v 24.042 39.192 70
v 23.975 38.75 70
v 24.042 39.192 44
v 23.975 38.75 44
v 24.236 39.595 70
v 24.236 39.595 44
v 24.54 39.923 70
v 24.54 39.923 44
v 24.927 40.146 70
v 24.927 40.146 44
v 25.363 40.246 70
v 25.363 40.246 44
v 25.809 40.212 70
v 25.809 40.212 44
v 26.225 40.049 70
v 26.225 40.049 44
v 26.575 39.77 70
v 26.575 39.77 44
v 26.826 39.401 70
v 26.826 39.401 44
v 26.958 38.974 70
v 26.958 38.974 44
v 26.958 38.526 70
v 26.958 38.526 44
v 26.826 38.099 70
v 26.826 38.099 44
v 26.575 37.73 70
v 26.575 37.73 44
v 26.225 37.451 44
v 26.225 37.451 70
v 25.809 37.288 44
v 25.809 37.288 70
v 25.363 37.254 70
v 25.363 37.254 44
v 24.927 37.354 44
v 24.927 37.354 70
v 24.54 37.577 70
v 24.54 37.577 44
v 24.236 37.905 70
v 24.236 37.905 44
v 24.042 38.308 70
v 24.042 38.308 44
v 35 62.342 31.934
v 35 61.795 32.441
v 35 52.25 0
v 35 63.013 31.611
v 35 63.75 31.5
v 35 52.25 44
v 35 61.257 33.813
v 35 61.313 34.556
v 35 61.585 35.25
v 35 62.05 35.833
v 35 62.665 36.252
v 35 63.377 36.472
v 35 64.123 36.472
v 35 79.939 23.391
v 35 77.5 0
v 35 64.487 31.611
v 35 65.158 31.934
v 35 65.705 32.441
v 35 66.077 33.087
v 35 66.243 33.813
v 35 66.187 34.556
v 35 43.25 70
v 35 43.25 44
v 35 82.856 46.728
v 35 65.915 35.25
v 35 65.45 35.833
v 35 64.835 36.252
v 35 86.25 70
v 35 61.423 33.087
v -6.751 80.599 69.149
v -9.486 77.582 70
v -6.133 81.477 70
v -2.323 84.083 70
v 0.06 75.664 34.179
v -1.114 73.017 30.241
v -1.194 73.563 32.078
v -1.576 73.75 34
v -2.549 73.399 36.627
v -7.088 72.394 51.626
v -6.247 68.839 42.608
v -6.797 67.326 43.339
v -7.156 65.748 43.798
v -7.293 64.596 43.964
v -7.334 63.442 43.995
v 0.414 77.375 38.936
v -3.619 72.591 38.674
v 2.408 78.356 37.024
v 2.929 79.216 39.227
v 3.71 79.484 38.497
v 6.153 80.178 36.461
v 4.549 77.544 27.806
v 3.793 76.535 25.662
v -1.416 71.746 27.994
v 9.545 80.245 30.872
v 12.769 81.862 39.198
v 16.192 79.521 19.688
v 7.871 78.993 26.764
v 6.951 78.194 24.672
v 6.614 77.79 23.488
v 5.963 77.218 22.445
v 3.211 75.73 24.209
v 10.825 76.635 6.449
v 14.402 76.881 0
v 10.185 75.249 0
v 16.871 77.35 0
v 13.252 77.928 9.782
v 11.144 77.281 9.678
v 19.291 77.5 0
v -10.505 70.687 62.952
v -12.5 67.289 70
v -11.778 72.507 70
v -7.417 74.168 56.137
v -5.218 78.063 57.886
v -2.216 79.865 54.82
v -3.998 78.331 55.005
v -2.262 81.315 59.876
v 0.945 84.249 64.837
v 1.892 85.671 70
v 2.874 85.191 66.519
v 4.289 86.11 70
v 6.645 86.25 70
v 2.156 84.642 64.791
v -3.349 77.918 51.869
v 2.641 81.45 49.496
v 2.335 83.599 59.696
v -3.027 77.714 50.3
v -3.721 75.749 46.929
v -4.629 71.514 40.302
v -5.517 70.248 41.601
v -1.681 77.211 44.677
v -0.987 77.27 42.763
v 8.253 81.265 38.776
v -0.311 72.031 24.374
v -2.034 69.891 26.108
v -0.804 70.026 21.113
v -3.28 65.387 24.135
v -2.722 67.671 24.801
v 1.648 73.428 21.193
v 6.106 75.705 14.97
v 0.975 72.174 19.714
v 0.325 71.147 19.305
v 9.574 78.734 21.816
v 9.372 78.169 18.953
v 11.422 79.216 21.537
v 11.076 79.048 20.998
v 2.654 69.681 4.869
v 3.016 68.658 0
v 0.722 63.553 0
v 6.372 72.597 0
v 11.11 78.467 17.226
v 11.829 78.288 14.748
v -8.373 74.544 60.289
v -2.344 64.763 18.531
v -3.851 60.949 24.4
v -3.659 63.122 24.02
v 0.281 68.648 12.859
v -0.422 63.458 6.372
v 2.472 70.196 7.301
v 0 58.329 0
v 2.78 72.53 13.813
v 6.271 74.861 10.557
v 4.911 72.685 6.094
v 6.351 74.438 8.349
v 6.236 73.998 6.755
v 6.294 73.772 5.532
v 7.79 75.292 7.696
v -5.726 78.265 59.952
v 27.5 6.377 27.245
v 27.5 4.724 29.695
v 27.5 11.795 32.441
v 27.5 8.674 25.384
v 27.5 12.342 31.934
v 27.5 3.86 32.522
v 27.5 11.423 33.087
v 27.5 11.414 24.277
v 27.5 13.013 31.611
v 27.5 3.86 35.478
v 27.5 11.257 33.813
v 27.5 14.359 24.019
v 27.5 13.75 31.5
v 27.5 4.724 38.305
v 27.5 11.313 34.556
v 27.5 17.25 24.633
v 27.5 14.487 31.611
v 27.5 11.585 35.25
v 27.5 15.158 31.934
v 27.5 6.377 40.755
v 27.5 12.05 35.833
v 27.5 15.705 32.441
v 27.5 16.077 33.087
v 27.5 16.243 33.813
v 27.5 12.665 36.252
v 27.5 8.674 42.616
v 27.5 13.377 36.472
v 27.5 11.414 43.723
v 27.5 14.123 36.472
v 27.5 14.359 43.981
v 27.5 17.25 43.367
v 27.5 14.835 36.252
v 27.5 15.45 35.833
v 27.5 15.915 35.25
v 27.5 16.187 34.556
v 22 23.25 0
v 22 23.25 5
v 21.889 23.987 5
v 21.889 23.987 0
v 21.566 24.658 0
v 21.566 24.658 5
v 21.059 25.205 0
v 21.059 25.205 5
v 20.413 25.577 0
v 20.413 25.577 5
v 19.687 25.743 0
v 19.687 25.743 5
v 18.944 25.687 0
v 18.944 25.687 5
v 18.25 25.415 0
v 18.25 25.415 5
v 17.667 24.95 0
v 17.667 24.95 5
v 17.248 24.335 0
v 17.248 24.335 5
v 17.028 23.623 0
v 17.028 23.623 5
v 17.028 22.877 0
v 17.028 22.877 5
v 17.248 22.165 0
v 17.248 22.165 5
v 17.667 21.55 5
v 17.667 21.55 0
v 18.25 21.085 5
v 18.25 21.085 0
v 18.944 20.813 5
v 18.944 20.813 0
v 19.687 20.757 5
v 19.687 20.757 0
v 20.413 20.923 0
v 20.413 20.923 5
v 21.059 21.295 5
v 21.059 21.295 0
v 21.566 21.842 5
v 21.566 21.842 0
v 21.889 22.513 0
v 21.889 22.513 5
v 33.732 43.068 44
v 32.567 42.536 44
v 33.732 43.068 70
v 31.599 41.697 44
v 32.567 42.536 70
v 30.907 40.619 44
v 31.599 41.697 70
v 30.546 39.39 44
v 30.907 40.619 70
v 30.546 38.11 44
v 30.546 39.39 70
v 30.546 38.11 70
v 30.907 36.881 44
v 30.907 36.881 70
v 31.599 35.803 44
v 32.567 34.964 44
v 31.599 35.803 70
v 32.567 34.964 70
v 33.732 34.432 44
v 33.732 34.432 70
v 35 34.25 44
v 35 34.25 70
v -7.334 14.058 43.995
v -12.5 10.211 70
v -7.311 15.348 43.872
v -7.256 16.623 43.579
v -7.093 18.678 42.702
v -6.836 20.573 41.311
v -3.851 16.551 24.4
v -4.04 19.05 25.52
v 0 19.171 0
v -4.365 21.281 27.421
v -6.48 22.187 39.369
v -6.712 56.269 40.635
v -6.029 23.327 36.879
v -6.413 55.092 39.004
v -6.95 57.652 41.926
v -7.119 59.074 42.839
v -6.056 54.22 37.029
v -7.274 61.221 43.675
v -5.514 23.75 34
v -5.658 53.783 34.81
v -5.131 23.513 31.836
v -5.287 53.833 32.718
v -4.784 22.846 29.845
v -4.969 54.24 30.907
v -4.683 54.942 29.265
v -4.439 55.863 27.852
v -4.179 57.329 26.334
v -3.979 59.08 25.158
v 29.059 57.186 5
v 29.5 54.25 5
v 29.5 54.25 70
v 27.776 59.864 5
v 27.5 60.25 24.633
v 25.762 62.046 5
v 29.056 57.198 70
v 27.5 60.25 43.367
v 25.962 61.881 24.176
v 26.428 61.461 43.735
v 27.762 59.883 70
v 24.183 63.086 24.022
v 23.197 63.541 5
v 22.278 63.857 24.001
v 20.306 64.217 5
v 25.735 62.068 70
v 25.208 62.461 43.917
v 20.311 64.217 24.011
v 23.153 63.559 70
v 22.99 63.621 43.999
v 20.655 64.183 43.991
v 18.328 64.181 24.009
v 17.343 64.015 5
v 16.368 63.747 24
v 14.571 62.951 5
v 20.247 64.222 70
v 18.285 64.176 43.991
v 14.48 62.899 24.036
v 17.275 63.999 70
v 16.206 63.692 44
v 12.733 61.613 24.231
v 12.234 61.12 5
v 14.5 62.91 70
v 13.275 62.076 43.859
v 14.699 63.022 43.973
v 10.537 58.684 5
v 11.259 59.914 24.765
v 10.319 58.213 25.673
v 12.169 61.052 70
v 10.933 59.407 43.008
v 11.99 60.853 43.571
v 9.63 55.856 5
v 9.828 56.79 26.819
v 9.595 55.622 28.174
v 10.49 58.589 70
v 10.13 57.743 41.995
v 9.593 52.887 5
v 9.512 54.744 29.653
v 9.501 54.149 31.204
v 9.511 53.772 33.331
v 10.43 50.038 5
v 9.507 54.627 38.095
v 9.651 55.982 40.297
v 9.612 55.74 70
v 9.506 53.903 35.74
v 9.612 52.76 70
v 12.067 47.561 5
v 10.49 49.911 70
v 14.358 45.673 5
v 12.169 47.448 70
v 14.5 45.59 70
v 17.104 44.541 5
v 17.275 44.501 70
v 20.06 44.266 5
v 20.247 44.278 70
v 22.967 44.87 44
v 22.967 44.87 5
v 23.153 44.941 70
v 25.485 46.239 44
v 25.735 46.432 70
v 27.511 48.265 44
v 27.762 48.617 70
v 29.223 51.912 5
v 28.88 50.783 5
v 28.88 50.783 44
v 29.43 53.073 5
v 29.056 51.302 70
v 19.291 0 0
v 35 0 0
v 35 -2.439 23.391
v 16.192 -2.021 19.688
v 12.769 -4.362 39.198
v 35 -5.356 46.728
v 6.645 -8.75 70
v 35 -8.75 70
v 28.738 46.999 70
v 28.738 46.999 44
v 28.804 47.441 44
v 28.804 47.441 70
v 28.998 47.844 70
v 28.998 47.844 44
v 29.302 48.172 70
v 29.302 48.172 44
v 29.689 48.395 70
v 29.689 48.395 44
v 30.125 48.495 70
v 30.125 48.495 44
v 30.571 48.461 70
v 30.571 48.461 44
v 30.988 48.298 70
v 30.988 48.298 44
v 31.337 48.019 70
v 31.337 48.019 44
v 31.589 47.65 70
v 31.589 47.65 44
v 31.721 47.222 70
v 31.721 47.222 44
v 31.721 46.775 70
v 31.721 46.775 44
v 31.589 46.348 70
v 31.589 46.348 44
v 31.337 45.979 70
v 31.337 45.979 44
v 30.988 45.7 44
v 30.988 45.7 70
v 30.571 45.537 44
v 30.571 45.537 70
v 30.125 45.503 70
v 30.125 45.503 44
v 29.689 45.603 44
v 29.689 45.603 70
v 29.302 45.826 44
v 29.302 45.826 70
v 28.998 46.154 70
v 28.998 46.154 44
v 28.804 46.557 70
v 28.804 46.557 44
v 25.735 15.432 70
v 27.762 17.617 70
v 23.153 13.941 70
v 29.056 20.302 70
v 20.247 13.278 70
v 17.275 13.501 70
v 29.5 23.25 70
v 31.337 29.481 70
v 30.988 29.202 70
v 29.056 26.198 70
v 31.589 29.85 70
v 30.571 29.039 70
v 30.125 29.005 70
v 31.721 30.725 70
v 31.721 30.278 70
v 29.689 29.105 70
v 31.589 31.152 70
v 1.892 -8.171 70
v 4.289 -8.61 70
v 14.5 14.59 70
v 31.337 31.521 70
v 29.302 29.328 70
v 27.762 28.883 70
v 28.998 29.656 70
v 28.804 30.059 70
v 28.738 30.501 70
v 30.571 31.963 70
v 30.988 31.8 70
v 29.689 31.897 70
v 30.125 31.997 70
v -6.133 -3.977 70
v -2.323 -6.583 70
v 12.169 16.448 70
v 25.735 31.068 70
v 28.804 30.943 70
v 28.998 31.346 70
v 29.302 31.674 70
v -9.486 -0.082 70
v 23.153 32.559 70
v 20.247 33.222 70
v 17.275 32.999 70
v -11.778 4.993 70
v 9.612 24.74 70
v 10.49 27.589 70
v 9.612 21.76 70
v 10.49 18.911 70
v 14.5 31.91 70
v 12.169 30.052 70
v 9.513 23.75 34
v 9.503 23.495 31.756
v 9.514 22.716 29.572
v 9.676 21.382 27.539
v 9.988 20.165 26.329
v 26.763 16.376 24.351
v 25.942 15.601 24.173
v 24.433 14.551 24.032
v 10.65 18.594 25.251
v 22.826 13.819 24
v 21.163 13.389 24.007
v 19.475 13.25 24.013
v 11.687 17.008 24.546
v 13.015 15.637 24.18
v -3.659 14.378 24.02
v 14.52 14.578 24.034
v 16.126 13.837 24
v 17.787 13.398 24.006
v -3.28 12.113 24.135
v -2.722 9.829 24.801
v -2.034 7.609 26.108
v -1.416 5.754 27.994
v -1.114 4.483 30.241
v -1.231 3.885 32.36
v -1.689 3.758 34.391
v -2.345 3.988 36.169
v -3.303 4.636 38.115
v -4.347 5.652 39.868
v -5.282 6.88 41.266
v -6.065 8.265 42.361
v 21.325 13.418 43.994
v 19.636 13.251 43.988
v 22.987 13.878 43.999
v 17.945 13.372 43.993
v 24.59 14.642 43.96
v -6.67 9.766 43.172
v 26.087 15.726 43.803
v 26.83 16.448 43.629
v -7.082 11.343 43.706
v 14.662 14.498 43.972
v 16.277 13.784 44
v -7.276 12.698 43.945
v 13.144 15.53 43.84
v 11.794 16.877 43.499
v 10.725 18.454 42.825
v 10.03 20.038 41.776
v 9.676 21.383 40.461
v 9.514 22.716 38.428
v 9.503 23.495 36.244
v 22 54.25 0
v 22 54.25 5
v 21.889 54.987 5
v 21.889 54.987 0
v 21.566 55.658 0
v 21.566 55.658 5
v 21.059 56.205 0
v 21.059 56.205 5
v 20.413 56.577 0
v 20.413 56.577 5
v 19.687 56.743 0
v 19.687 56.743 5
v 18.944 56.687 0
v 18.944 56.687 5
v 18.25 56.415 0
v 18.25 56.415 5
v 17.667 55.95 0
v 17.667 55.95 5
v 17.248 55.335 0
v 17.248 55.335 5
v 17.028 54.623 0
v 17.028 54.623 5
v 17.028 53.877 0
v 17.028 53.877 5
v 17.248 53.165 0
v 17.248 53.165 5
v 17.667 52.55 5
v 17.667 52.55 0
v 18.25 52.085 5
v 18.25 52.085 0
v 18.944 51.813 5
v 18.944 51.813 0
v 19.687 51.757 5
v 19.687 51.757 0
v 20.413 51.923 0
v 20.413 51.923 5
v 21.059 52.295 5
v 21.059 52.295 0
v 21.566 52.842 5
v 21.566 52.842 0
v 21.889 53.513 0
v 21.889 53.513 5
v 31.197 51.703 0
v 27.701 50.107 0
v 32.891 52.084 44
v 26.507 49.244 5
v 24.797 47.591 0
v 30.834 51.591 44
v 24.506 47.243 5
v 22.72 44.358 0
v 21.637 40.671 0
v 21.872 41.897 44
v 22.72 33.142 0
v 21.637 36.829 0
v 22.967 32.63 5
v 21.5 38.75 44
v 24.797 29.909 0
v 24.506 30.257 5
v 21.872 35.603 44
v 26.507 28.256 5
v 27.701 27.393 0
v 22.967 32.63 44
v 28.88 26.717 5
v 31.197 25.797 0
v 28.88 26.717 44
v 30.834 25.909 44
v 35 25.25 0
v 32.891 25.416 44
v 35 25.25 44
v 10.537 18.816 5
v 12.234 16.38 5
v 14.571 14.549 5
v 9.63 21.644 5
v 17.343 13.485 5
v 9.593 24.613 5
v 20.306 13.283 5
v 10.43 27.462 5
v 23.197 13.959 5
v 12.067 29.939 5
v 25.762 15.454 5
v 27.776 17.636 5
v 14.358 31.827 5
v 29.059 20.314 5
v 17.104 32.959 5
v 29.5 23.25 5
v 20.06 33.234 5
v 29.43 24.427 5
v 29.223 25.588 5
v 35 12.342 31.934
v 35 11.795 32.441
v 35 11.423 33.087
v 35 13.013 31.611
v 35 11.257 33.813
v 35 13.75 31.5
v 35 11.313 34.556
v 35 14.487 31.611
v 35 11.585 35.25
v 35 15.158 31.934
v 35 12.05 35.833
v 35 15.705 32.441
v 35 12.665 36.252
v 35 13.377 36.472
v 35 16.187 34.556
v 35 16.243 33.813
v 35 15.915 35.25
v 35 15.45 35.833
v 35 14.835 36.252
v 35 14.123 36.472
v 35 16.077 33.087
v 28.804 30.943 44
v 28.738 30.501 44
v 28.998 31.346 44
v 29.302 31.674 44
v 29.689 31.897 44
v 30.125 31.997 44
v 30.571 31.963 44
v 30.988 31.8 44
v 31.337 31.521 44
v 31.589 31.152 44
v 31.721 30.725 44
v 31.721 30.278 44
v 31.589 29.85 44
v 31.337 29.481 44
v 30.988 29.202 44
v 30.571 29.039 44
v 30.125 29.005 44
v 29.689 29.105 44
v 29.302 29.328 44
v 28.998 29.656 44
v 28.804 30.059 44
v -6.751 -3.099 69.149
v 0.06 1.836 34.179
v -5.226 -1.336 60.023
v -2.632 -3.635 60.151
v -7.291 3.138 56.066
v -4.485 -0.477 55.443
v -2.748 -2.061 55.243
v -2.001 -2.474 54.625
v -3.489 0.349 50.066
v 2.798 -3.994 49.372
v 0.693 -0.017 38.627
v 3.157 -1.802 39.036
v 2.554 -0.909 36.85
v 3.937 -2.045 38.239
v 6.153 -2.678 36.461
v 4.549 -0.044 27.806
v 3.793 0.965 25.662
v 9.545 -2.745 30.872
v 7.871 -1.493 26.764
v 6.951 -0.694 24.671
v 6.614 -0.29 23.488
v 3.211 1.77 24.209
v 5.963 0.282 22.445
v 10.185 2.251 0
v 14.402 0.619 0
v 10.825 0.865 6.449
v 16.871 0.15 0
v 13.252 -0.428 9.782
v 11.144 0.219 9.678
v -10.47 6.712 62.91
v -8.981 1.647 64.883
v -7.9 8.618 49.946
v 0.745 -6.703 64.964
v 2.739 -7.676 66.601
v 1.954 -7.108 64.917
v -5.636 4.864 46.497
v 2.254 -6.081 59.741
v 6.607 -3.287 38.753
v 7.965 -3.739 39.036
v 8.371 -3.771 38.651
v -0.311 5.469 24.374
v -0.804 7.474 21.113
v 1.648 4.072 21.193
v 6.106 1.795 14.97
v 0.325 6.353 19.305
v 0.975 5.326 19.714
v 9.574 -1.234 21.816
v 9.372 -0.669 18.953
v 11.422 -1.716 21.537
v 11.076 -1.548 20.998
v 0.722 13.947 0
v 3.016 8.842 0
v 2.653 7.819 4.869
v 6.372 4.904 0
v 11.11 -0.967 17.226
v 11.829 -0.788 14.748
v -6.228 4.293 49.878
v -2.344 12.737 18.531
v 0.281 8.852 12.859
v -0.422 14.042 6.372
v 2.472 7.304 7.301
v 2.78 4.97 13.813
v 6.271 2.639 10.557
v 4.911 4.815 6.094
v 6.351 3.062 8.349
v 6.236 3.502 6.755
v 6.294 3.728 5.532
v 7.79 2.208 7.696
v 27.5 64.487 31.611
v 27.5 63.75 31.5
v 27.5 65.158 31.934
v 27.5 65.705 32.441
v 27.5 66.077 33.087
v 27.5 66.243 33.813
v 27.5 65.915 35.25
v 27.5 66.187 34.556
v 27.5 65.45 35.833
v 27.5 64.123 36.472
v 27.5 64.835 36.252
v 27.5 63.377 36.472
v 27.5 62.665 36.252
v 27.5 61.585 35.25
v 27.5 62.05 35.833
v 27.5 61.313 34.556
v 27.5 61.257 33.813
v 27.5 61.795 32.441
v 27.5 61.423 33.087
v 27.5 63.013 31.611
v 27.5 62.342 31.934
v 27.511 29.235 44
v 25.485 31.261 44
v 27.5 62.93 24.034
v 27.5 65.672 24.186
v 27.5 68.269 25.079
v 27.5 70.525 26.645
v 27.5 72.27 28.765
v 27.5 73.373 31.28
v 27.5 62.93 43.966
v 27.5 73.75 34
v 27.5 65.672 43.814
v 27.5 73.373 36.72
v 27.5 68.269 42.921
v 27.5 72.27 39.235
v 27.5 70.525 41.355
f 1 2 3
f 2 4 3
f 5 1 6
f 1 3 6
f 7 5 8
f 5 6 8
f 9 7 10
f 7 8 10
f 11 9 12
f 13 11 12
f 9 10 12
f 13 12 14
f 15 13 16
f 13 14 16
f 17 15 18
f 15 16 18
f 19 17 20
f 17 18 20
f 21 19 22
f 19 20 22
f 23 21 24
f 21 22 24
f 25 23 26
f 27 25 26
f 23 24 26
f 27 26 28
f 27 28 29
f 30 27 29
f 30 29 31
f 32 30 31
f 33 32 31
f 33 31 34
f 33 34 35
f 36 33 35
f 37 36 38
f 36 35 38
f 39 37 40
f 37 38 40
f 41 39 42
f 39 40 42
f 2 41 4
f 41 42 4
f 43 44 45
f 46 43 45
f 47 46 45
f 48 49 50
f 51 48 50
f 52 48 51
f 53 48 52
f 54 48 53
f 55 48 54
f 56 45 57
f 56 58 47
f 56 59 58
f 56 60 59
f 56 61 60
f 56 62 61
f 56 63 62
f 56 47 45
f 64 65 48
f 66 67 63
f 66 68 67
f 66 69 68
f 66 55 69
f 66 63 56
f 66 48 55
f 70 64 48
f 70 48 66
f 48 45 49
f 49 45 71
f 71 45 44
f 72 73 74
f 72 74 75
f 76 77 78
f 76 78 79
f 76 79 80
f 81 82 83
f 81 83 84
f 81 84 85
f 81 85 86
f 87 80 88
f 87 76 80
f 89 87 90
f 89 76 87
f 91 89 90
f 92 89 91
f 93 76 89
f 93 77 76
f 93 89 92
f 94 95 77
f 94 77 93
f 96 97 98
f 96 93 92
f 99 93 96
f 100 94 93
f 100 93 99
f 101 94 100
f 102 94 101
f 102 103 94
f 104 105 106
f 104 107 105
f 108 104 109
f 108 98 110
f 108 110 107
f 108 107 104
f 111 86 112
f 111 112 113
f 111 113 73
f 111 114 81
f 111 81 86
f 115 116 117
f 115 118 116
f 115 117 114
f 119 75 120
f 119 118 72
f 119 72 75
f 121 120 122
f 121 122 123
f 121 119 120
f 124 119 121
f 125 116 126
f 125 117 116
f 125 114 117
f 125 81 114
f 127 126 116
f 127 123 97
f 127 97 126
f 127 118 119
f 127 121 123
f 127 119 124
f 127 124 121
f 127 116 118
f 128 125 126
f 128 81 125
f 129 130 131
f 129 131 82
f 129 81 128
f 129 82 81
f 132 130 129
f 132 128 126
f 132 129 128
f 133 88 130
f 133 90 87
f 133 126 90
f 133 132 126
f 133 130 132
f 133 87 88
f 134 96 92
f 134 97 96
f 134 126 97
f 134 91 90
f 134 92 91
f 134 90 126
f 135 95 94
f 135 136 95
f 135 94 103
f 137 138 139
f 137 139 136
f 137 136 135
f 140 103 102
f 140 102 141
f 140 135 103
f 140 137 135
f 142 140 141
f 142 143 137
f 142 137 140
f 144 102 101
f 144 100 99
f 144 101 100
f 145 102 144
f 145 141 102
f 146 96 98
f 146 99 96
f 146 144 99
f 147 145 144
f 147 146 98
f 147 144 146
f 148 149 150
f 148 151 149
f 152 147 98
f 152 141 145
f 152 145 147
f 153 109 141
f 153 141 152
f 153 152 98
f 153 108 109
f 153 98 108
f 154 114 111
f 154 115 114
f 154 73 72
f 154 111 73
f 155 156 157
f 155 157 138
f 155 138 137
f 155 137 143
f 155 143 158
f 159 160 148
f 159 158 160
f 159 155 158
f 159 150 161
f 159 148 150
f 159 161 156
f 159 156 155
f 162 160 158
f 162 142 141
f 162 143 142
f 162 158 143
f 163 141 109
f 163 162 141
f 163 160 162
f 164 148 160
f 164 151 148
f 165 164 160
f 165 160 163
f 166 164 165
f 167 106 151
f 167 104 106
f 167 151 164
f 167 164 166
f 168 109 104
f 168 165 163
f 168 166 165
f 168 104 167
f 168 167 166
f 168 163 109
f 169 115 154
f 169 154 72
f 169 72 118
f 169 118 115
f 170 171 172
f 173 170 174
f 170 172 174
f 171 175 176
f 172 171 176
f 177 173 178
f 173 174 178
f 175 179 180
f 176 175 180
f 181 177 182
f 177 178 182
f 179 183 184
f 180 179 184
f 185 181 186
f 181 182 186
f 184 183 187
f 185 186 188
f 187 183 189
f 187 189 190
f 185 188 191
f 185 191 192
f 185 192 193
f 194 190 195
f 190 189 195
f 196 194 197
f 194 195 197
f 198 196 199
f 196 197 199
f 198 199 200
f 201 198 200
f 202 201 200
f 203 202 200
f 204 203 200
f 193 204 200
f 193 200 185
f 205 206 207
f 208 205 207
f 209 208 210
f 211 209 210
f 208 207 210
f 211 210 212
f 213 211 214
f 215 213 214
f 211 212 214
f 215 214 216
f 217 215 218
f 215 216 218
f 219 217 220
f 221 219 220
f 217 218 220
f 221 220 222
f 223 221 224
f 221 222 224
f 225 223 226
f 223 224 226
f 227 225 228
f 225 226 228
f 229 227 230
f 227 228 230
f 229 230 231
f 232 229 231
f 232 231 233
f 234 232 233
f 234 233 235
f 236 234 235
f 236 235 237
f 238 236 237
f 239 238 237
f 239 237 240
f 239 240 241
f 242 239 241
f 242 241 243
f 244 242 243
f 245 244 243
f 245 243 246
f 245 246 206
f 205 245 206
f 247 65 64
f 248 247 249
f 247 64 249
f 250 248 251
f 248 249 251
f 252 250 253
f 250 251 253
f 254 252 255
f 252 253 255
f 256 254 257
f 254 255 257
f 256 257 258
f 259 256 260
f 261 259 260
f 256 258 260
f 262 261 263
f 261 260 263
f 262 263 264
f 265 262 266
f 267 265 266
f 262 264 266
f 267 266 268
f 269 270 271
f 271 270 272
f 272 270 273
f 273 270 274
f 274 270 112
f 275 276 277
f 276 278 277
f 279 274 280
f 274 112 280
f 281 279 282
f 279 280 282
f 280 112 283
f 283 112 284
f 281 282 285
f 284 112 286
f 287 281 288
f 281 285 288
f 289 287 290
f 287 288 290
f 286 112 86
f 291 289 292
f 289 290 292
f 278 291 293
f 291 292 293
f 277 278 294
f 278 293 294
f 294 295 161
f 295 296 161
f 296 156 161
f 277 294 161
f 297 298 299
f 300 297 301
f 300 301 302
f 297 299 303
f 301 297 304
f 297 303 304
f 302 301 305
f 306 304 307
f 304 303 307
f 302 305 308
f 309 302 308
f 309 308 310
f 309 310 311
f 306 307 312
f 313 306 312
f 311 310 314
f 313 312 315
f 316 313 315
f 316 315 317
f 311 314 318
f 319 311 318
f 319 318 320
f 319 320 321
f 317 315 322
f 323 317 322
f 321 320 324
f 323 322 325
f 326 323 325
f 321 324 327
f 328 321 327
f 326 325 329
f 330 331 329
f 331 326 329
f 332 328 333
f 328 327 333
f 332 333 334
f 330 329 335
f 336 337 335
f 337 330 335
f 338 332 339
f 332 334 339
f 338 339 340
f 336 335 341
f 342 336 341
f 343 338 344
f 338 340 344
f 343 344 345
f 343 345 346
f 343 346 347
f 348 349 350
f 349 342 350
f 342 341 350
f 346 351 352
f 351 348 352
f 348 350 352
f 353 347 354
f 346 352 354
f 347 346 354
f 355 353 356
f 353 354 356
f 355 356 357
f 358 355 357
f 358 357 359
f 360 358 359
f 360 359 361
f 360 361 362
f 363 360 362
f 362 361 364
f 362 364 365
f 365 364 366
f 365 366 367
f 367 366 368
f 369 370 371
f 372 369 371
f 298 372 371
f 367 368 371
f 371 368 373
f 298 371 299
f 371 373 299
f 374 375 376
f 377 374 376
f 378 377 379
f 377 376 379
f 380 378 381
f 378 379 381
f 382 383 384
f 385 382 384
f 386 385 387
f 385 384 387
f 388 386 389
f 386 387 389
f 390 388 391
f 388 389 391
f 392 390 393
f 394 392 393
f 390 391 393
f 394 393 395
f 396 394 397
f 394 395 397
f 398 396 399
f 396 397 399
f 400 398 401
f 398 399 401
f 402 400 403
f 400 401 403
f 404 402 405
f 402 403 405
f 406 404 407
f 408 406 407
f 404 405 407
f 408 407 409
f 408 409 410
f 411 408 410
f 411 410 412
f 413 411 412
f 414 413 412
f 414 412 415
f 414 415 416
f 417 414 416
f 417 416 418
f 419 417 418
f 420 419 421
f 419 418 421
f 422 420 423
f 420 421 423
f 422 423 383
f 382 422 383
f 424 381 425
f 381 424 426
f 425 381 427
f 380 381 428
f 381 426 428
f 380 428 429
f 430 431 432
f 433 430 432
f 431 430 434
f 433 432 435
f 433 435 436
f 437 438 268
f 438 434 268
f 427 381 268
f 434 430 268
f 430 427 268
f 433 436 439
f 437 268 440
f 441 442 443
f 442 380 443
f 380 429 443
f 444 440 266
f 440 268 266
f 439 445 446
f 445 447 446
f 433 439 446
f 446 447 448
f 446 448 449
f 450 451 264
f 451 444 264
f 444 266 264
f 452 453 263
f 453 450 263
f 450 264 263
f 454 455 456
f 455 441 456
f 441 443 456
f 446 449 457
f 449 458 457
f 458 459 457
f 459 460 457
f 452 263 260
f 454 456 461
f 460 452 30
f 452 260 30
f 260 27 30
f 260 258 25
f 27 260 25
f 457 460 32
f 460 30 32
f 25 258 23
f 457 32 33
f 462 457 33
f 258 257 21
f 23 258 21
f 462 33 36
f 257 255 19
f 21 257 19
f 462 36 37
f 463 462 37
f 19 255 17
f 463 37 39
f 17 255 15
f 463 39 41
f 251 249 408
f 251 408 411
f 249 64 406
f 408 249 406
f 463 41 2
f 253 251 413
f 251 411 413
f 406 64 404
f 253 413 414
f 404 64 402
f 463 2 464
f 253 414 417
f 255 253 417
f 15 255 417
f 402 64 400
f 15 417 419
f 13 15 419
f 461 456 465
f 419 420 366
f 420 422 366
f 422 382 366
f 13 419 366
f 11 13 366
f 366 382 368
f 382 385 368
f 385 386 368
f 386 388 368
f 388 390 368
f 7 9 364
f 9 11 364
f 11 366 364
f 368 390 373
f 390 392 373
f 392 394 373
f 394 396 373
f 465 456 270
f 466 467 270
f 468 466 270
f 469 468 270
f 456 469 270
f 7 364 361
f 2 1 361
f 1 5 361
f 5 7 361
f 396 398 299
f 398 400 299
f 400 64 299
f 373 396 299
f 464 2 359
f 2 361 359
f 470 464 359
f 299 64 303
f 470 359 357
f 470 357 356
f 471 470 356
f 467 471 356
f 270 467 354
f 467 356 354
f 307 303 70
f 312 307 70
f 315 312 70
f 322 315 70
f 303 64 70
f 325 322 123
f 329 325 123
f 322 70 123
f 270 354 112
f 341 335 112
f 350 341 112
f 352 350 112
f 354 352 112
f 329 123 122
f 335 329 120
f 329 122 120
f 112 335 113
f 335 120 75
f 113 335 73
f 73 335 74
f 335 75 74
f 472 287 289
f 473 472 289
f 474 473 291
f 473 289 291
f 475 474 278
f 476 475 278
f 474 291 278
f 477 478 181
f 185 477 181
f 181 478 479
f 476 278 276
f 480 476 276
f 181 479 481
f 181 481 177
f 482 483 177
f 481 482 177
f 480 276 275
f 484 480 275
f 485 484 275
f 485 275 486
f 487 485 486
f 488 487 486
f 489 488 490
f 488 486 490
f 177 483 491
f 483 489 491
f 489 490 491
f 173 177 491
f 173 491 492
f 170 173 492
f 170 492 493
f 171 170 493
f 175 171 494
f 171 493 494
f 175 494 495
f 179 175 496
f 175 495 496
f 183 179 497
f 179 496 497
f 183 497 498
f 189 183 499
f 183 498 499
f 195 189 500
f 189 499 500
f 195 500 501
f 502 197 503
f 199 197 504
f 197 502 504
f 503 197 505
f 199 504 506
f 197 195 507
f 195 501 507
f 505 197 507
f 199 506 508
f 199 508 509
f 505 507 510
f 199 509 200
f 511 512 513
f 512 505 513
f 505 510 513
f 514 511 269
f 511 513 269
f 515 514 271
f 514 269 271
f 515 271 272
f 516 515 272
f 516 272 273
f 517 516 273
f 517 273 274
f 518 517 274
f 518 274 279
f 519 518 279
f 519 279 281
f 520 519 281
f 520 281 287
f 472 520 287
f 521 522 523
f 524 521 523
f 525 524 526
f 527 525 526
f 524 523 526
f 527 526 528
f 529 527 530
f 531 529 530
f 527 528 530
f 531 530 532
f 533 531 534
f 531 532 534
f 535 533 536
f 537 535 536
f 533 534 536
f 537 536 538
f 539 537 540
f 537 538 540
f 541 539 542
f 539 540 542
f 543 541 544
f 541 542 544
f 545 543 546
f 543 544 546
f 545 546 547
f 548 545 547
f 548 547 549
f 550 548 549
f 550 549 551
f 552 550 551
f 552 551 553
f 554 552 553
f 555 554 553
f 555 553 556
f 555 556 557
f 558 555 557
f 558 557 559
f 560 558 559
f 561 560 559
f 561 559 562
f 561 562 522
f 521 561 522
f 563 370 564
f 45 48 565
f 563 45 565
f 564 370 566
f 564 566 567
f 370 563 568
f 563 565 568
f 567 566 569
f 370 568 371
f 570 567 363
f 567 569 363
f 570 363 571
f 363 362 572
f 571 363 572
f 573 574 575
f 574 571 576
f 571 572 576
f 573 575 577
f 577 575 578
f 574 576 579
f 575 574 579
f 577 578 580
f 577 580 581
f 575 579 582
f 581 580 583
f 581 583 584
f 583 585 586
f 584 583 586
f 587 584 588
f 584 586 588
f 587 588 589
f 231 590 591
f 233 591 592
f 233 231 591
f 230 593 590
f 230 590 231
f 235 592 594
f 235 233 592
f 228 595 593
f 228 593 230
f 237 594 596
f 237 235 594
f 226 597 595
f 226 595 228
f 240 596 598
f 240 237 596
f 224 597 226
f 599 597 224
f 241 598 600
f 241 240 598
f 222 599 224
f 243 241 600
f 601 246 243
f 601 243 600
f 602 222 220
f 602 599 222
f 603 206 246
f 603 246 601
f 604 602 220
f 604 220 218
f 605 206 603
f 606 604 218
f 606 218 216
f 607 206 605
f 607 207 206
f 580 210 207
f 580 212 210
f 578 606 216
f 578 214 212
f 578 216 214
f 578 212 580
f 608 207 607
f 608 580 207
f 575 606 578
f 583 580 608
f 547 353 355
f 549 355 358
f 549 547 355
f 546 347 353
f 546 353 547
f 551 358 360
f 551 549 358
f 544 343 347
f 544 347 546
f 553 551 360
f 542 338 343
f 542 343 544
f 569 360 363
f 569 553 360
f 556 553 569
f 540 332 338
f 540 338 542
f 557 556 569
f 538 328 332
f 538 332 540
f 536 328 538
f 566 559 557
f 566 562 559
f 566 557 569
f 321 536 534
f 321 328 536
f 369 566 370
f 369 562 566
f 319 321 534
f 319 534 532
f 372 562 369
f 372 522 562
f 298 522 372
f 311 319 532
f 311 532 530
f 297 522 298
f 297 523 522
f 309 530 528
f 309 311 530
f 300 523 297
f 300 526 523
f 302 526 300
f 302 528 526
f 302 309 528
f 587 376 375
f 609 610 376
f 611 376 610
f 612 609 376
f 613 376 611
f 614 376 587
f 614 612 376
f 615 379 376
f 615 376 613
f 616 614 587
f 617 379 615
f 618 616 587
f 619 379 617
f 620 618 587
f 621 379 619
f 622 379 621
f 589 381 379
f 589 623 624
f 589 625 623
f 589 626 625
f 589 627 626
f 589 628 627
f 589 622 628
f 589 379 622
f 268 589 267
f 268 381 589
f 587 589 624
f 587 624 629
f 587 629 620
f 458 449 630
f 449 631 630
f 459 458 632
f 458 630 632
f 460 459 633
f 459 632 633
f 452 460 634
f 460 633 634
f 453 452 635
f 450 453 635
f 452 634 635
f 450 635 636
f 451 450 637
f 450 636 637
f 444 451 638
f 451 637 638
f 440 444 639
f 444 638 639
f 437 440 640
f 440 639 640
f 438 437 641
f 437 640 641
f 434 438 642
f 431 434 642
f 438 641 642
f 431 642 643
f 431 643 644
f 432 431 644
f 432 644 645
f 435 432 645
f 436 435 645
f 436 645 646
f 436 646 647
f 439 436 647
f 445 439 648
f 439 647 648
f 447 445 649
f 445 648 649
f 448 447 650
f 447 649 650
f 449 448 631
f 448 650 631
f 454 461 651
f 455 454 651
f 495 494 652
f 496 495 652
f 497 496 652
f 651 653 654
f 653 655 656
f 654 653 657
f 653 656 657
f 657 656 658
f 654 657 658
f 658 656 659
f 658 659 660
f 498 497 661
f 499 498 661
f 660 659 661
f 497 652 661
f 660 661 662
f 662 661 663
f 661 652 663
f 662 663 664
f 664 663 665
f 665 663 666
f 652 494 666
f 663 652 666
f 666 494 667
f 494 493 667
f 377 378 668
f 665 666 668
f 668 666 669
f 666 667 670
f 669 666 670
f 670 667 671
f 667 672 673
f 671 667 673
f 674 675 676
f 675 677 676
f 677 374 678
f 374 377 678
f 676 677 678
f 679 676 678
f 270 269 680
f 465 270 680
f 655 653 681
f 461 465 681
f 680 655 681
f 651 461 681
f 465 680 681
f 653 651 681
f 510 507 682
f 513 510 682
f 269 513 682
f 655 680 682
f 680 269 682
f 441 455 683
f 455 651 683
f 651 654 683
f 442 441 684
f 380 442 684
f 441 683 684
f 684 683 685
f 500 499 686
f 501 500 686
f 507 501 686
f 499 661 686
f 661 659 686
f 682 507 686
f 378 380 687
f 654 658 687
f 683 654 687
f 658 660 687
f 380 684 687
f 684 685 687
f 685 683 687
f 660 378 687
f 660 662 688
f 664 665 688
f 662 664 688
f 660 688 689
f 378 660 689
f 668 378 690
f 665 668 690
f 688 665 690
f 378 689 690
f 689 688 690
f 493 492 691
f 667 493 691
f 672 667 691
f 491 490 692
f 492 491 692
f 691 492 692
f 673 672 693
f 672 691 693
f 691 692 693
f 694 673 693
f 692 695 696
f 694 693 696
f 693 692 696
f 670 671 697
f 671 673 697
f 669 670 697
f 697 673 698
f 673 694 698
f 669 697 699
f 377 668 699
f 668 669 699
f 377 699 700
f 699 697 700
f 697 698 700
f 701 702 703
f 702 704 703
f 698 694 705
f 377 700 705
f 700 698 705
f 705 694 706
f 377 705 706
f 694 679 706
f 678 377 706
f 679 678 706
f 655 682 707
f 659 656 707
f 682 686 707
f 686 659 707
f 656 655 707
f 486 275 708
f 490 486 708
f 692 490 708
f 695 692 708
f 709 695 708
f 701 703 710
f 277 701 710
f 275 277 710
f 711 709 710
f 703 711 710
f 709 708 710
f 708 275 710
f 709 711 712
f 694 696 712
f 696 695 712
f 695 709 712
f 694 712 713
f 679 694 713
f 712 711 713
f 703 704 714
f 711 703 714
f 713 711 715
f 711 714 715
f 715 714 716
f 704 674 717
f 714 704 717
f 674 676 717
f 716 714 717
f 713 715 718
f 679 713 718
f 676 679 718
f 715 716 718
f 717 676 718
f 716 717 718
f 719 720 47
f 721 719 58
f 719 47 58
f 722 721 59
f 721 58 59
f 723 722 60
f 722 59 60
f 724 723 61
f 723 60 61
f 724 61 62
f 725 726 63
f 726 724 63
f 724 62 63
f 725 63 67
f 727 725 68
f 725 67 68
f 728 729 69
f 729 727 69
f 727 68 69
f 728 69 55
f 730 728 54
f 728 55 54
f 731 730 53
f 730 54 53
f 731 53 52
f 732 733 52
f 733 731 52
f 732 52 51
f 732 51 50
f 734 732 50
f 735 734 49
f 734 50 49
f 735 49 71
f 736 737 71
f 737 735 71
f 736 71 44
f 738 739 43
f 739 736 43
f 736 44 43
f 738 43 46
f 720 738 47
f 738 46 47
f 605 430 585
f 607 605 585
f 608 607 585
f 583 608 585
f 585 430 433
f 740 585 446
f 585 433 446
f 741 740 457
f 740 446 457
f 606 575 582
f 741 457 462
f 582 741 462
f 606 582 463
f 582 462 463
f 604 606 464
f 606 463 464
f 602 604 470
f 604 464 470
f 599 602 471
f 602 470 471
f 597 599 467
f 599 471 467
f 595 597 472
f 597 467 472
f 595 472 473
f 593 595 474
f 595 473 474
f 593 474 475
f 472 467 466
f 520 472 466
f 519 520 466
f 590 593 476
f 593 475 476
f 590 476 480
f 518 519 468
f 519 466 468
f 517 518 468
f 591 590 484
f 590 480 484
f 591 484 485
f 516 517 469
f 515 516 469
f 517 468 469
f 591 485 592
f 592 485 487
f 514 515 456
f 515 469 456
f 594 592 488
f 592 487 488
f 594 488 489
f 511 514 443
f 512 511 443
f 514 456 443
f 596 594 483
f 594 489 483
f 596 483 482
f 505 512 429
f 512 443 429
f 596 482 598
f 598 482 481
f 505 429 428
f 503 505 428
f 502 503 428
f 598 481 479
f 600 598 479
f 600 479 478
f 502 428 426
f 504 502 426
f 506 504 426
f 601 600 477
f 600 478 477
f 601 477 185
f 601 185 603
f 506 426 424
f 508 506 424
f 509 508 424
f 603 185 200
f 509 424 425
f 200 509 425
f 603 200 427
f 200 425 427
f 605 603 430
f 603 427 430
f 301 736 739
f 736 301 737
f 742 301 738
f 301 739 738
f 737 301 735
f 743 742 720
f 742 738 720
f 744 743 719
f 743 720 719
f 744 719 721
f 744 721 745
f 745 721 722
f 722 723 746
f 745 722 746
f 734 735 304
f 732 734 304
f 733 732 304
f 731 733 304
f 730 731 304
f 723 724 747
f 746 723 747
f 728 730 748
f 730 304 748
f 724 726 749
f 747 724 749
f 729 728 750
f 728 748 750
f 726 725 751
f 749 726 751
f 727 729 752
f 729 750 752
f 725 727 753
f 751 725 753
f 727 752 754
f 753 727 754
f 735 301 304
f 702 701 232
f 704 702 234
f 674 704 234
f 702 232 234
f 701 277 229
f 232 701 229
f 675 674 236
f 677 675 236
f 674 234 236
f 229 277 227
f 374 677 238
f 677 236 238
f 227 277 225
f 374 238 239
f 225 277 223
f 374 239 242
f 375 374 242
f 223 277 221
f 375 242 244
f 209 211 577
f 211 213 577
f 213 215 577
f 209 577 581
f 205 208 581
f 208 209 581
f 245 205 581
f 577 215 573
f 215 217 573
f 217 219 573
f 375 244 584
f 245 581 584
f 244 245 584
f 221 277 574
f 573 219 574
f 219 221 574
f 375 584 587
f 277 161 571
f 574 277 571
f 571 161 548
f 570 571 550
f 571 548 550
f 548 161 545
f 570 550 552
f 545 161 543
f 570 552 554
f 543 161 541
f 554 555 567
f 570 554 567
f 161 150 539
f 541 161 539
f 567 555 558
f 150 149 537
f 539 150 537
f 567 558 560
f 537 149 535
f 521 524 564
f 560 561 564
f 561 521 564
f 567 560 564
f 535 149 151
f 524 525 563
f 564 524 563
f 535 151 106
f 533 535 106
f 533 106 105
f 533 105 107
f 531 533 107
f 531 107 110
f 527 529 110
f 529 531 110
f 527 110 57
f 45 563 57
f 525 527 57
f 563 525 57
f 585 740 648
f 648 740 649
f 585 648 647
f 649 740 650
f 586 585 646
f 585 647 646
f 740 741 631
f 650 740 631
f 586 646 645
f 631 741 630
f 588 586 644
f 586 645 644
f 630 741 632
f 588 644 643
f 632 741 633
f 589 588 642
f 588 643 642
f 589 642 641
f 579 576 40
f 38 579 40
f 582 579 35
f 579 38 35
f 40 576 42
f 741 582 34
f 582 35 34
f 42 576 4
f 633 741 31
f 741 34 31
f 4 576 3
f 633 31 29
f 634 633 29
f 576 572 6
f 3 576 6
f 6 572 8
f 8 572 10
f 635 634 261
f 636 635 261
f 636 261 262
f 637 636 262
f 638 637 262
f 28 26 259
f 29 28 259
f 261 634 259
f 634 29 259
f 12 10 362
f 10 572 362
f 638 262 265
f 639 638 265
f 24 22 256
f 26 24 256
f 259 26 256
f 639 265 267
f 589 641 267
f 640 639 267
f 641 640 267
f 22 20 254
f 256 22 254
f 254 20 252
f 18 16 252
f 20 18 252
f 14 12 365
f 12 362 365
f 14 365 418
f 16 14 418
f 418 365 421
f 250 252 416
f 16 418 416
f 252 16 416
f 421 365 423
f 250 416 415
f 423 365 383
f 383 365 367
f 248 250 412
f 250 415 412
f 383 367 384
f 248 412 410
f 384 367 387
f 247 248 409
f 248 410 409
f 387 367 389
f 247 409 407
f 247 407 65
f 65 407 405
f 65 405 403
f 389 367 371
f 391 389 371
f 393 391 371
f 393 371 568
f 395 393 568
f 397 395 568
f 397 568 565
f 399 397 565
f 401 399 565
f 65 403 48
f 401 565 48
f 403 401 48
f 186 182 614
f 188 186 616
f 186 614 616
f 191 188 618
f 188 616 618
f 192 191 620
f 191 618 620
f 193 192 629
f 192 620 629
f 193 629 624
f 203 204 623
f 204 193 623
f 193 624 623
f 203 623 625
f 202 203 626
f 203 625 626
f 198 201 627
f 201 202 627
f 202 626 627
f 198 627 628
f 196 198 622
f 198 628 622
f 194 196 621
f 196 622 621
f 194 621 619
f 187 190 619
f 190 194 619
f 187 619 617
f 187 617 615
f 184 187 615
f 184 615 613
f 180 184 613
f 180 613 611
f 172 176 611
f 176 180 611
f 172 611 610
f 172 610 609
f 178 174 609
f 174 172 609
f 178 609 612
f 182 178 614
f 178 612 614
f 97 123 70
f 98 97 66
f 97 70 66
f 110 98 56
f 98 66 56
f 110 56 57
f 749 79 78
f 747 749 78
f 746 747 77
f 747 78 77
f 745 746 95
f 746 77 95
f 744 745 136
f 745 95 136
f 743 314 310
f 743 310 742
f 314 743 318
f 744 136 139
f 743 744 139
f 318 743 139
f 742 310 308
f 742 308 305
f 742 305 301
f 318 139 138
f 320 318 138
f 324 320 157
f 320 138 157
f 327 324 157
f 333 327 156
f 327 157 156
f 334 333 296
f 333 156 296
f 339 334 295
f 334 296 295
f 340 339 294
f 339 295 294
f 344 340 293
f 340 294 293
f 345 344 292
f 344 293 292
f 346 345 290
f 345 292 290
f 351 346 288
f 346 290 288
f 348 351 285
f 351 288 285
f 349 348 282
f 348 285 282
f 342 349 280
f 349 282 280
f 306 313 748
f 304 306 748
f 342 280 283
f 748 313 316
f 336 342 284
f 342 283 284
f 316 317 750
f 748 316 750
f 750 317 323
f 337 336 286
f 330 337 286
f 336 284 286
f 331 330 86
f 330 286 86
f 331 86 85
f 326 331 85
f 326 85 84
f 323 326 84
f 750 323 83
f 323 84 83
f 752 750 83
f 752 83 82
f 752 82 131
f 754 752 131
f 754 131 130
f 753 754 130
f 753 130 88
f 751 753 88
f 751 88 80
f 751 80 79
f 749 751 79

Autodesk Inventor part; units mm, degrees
sketch "Sketch1" plane through (0, 0, 0) normal (0, 0, 1) x (1, 0, 0)
  line L0 (0, 0) -> (70, 0)
  line L1 (70, 0) -> (70, 77.5)
  line L2 (70, 77.5) -> (0, 77.5)
  line L3 (0, 77.5) -> (0, 0)
  dimension "d0" = 70
  dimension "d1" = 77.5
extrude "Extrusion1" add sketch "Sketch1" along normal blind 70
sketch "Sketch3" plane through (0, 0, 70) normal (0, 0, 1) x (1, 0, 0)
  line L0 (0, 0) -> (70, 0) projected
  line L1 (70, 77.5) -> (0, 77.5) projected
  line L2 (70, 0) -> (35, 0)
  line L3 (35, 0) -> (35, 77.5)
  line L4 (35, 77.5) -> (70, 77.5)
  line L5 (70, 77.5) -> (70, 0)
extrude "Extrusion3" cut sketch "Sketch3" against normal through all
sketch "Sketch4" plane through (0, 77.5, 70) normal (0, 1, 0) x (1, 0, 0)
  line L0 (0, 70) -> (0, 0) projected
  line L1 (0, 0) -> (-12.5, 0)
  line L2 (35, 70) -> (0, 70) projected
  arc A0 (-12.5, 0) -> (0, 70) centre (-1137.8005, 237.0626) ccw
  line L3 (-12.5, -10) -> (35, -10) construction
  dimension "d9" = 1150
  dimension "d54" = 47.5
  dimension "d55" = 10
extrude "Extrusion4" add sketch "Sketch4" against normal blind 77.5
sketch "Sketch5" plane through (35, 0, 70) normal (1, 0, 0) x (0, 0, -1)
  line L0 (0, 77.5) -> (0, 86.25)
  line L1 (0, 0) -> (0, -8.75)
  line L2 (0, 0) -> (0, 77.5) projected
  line L3 (70, 77.5) -> (70, 0) projected
  arc A0 (0, 86.25) -> (70, 77.5) centre (177.5728, 1222.4577) ccw
  arc A1 (70, 0) -> (0, -8.75) centre (177.5728, -1144.9577) ccw
  line L4 (0, 77.5) -> (70, 77.5) projected
  line L5 (70, 0) -> (0, 0) projected
  line L6 (-10, 86.25) -> (-10, -8.75) construction
  point P0 (-10, 38.75)
  point P1 (0, 38.75)
  dimension "d14" = 1150
  dimension "d15" = 1150
  dimension "d52" = 10
  dimension "d53" = 95
extrude "Extrusion5" add sketch "Sketch5" against normal blind 55 contours L0 A0 L4 | L5 A1 L1
sketch "Sketch6" plane through (-20, 0, 0) normal (0, 1, 0) x (1, 0, 0)
  line L0 (20, 0) -> (0, 0) projected
  line L1 (0, -70) -> (0, 0) projected
  arc A0 (7.5, -70) -> (20, 0) centre (-1117.8005, 167.0626) ccw projected
  line L2 (7.5, -70) -> (0, -70) projected
extrude "Extrusion6" cut sketch "Sketch6" along normal through all both and the other way through all
fillet "Fillet3" radius 19.35 2 edges at (-5.7463, 81.368, 35.3063) (-5.7463, -3.868, 35.3063)
ref_plane "Work Plane3" through (0, 0, 65) normal (0, 0, 1) x (1, 0, 0)
sketch "Sketch24" plane through (0, 0, 65) normal (0, 0, 1) x (1, 0, 0)
  line L0 (35, 77.5) -> (35, 0) projected
  circle A0 centre (35, 38.75) radius 11.5
  point P0 (0, 0)
  dimension "d85" = 23
extrude "Extrusion20" cut sketch "Sketch24" against normal blind 9
sketch "Sketch26" plane through (0, 0, 70) normal (0, 0, 1) x (1, 0, 0)
  line L0 (35, 77.5) -> (35, 0) projected
  circle A0 centre (35, 38.75) radius 4.5
  point P0 (0, 0)
  dimension "d88" = 9
extrude "Extrusion21" cut sketch "Sketch26" against normal blind 50
ref_plane "Work Plane4" through (0, 0, 35) normal (0, 0, 1) x (1, 0, 0)
sketch "Sketch28" plane through (0, 0, 35) normal (0, 0, 1) x (1, 0, 0)
  line L0 (35, 43.25) -> (35, 34.25) projected
  circle A0 centre (35, 38.75) radius 11.5
  point P0 (0, 0)
  dimension "d92" = 23
extrude "Extrusion22" cut sketch "Sketch28" along normal blind 9
sketch "Sketch29" plane through (0, 0, 35) normal (0, 0, 1) x (1, 0, 0)
  line L0 (35, 43.25) -> (35, 34.25)
  circle A0 centre (35, 38.75) radius 11.5
  point P0 (0, 0)
  dimension "d96" = 23
extrude "Extrusion23" cut sketch "Sketch29" against normal through all
ref_plane "Work Plane6" through (-12.5, 38.75, 70) normal (1, 0, 0) x (0, 1, 0)
sketch "Sketch32" plane through (0, 0, 70) normal (0, 0, 1) x (1, 0, 0)
  circle A0 centre (19.5, 23.25) radius 2.5
  circle A1 centre (19.5, 54.25) radius 2.5
  line L0 (19.5, 54.25) -> (19.5, 23.25) construction
  arc A2 (35, 43.25) -> (35, 34.25) centre (35, 38.75) ccw projected
  line L1 (35, 86.25) -> (35, 43.25) projected
  point P0 (0, 0)
  point P1 (19.5, 38.75)
  dimension "d105" = 5
  dimension "d106" = 5
  dimension "d107" = 15.5
  dimension "d108" = 31
extrude "Extrusion26" cut sketch "Sketch32" against normal through all
sketch "Sketch33" plane through (0, 0, 70) normal (0, 0, 1) x (1, 0, 0)
  circle A0 centre (19.5, 54.25) radius 2.5 projected
  circle A1 centre (19.5, 23.25) radius 2.5 projected
  circle A2 centre (19.5, 54.25) radius 10
  circle A3 centre (19.5, 23.25) radius 10
  point P0 (0, 0)
  dimension "d111" = 20
  dimension "d112" = 20
extrude "Extrusion27" cut sketch "Sketch33" against normal blind 65
sketch "Sketch34" plane through (35, 50.25, 65) normal (1, 0, 0) x (0, 0, -1)
  circle A0 centre (31, 13.5) radius 2.5
  circle A1 centre (31, -36.5) radius 2.5
  line L0 (31, -36.5) -> (31, 13.5) construction
  line L1 (-5, -16) -> (-5, -7) projected
  line L2 (21, -7) -> (21, 0) projected
  point P0 (65, -50.25)
  point P1 (31, -11.5)
  point P2 (-5, -11.5)
  dimension "d115" = 5
  dimension "d116" = 5
  dimension "d117" = 50
  dimension "d118" = 10
extrude "Extrusion28" cut sketch "Sketch34" against normal through all
sketch "Sketch35" plane through (-12.5, 38.75, 70) normal (1, 0, 0) x (0, 1, 0)
  circle A0 centre (25, -36) radius 2.5 projected
  circle A1 centre (-25, -36) radius 2.5 projected
  circle A2 centre (25, -36) radius 10
  circle A3 centre (-25, -36) radius 10
  point P0 (-38.75, -70)
  dimension "d121" = 20
  dimension "d122" = 20
extrude "Extrusion29" cut sketch "Sketch35" along normal blind 40
sketch "Sketch36" plane through (0, 0, 44) normal (0, 0, -1) x (-1, 0, 0)
  arc A0 (-35, 34.25) -> (-35, 43.25) centre (-35, 38.75) ccw projected
  circle A1 centre (-35, 38.75) radius 13.5
  point P0 (0, 0)
  dimension "d125" = 27
extrude "Extrusion30" cut sketch "Sketch36" along normal through all
sketch "Sketch38" plane through (0, 0, 65) normal (0, 0, 1) x (1, 0, 0)
  arc A0 (35, 43.25) -> (35, 34.25) centre (35, 38.75) ccw projected
  line L0 (35, 27.25) -> (35, 34.25) projected
  arc A1 (35, 50.25) -> (35, 27.25) centre (35, 38.75) ccw projected
  line L1 (35, 43.25) -> (35, 50.25) projected
  point P0 (0, 0)
extrude "Extrusion32" add sketch "Sketch38" against normal blind 9
sketch "Sketch37" plane through (0, 0, 44) normal (0, 0, -1) x (-1, 0, 0)
  circle A0 centre (-25.475, 38.75) radius 1.5
  arc A1 (-35, 34.25) -> (-35, 43.25) centre (-35, 38.75) ccw projected
  circle A2 centre (-30.2375, 46.9989) radius 1.5
  circle A3 centre (-39.7625, 46.9989) radius 1.5
  circle A4 centre (-44.525, 38.75) radius 1.5
  circle A5 centre (-39.7625, 30.5011) radius 1.5
  circle A6 centre (-30.2375, 30.5011) radius 1.5
  point P0 (0, 0)
  dimension "d128" = 3
  dimension "d129" = 9.525
  dimension "d132" = 360
extrude "Extrusion31" cut sketch "Sketch37" against normal through all
properties part number "AA016" material "ABS Plastic"
